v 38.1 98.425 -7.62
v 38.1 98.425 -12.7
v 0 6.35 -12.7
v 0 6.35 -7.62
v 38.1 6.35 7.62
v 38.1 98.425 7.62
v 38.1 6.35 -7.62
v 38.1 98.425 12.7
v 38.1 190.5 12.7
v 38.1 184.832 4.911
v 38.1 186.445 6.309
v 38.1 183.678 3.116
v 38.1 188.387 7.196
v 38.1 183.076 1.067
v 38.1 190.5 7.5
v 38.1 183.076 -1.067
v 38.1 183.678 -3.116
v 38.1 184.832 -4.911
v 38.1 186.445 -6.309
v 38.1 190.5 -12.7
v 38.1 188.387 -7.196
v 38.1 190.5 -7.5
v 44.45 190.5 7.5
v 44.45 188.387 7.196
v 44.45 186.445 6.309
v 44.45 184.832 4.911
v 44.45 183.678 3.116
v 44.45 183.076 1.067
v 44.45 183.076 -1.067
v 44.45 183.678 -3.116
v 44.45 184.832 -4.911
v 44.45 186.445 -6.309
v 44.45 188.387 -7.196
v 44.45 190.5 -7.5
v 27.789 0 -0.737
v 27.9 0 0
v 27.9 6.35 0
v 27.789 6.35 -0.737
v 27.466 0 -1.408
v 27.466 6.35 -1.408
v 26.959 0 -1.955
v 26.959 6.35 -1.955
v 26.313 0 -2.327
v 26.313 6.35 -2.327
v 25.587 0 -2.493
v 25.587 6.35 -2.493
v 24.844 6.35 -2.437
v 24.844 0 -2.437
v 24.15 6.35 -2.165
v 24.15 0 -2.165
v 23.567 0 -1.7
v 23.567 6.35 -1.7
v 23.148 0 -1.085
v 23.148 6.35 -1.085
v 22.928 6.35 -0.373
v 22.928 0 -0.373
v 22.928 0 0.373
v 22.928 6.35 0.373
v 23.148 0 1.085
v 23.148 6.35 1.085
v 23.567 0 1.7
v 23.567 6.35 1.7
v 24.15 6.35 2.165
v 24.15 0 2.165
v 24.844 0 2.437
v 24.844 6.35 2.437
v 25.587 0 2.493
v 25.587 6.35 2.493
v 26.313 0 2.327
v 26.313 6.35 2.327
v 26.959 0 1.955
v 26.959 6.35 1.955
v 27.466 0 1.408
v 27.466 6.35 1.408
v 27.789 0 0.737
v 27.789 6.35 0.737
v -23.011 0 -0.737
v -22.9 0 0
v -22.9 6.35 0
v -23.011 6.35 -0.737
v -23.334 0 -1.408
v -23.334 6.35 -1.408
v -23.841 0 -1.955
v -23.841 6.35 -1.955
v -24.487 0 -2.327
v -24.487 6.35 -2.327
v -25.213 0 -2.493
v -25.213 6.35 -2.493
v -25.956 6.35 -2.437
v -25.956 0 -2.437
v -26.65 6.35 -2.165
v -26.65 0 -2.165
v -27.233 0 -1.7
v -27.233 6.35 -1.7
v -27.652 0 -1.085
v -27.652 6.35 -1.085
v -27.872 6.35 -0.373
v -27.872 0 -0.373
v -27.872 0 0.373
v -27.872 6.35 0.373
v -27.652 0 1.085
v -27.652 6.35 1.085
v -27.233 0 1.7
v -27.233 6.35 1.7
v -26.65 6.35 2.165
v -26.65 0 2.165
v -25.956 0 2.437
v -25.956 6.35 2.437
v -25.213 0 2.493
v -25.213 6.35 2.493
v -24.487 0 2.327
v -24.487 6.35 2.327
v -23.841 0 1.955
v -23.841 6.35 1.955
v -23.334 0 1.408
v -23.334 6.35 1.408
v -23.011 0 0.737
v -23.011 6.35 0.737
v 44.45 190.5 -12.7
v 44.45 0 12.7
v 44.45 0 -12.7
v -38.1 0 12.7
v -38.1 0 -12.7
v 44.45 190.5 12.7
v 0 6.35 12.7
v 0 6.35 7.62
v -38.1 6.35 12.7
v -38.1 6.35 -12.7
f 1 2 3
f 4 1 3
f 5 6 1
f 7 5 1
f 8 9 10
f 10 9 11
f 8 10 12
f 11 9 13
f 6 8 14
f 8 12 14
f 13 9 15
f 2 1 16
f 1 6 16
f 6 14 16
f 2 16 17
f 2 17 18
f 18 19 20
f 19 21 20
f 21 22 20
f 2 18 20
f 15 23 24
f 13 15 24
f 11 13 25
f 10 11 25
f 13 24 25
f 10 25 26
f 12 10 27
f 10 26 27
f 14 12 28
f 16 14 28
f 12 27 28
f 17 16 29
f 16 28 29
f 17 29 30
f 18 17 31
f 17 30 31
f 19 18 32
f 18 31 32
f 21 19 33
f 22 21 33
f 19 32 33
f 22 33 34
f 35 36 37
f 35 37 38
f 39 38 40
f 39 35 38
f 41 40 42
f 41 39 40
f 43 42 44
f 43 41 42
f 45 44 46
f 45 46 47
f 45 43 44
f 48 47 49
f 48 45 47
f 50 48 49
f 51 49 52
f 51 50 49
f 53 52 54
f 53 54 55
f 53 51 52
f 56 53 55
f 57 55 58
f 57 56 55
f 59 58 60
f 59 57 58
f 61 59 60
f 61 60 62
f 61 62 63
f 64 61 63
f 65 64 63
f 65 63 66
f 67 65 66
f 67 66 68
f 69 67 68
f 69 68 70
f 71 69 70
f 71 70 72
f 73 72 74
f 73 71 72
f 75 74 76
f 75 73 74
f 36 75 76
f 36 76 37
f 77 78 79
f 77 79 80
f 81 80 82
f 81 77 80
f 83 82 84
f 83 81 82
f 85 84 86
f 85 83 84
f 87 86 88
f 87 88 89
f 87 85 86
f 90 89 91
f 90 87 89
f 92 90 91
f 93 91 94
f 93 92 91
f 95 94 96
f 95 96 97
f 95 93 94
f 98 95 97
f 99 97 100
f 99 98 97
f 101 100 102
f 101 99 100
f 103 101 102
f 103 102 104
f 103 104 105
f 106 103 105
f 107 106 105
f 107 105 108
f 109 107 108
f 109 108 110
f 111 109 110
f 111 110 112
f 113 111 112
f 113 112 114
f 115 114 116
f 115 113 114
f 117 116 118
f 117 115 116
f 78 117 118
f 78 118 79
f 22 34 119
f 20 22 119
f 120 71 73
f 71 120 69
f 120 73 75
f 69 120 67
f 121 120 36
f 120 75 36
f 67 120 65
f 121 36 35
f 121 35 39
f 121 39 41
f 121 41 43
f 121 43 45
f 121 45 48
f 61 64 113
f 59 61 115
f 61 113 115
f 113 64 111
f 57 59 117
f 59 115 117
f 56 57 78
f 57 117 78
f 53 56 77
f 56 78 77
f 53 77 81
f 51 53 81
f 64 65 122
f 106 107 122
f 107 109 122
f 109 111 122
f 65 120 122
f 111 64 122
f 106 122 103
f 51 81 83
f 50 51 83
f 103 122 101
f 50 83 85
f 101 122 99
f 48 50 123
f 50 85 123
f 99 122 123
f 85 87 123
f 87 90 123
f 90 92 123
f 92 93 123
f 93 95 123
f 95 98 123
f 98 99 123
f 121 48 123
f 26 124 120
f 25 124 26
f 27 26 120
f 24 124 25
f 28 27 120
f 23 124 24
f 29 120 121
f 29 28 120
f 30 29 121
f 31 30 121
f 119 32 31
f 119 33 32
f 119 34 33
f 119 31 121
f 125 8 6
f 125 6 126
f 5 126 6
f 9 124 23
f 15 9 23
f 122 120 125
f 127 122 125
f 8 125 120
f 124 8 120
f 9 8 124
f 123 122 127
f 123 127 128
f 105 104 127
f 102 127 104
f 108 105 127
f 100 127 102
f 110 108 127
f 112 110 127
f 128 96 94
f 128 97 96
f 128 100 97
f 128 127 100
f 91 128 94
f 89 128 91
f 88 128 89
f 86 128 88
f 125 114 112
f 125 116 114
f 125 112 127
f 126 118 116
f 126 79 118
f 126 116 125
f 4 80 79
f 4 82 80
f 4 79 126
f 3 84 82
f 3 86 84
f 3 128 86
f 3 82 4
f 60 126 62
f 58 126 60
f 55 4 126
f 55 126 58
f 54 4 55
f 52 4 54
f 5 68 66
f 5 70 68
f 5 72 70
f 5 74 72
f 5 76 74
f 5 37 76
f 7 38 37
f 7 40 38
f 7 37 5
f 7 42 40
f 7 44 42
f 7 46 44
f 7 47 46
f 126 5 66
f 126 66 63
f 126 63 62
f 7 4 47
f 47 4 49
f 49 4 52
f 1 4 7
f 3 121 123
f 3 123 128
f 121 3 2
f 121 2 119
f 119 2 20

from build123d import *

# Parameters (mm, degrees)
SKETCH2_W           = 76.2
SKETCH2_H           = 25.4
SKETCH2_R           = 2.5
BOSS_EXTRUDE1_DEPTH = 6.35
SKETCH3_W           = 25.4
SKETCH3_H           = 190.5
BOSS_EXTRUDE2_DEPTH = 6.35
BOSS_EXTRUDE3_DEPTH = 5.08
SKETCH5_R           = 7.5
CUT_EXTRUDE1_DEPTH  = 37.592


with BuildPart() as part:
    # Sketch2 → Boss-Extrude1 (new body)
    with BuildSketch(Plane(origin=(0, 0, 0), x_dir=(1, 0, 0), z_dir=(0, 1, 0))):
        Rectangle(SKETCH2_W, SKETCH2_H)
        with Locations((-25.4, 0)):
            Circle(SKETCH2_R, mode=Mode.SUBTRACT)
        with Locations((25.4, 0)):
            Circle(SKETCH2_R, mode=Mode.SUBTRACT)
    extrude(amount=BOSS_EXTRUDE1_DEPTH)

    # Sketch3 → Boss-Extrude2 (add)
    with BuildSketch(Plane(origin=(38.1, 0, 0), x_dir=(0, 0, -1), z_dir=(1, 0, 0))):
        with Locations((0, 95.25)):
            Rectangle(SKETCH3_W, SKETCH3_H)
    extrude(amount=BOSS_EXTRUDE2_DEPTH)


with BuildPart() as body_2:
    # Sketch4 → Boss-Extrude3 (new body)
    with BuildSketch(Plane.XY.offset(12.7)):
        Polygon((22.9, 6.35), (27.9, 6.35), (38.1, 6.35), (38.1, 98.425), (0, 6.35), align=None)
    extrude(amount=-BOSS_EXTRUDE3_DEPTH)


with BuildPart() as body_3:
    # Mirror2: mirrored copy
    add(body_2.part.mirror(Plane.XY))


with BuildPart() as body_2_1:
    add(body_2.part)

    # Combine1: union body 3, part
    add(body_3.part)
    add(part.part)

    # Sketch5 → Cut-Extrude1 (cut)
    with BuildSketch(Plane(origin=(44.45, 0, 0), x_dir=(0, 0, -1), z_dir=(1, 0, 0))):
        with Locations((0, 190.5)):
            Circle(SKETCH5_R)
    extrude(amount=-CUT_EXTRUDE1_DEPTH, mode=Mode.SUBTRACT)


solid = body_2_1.part
